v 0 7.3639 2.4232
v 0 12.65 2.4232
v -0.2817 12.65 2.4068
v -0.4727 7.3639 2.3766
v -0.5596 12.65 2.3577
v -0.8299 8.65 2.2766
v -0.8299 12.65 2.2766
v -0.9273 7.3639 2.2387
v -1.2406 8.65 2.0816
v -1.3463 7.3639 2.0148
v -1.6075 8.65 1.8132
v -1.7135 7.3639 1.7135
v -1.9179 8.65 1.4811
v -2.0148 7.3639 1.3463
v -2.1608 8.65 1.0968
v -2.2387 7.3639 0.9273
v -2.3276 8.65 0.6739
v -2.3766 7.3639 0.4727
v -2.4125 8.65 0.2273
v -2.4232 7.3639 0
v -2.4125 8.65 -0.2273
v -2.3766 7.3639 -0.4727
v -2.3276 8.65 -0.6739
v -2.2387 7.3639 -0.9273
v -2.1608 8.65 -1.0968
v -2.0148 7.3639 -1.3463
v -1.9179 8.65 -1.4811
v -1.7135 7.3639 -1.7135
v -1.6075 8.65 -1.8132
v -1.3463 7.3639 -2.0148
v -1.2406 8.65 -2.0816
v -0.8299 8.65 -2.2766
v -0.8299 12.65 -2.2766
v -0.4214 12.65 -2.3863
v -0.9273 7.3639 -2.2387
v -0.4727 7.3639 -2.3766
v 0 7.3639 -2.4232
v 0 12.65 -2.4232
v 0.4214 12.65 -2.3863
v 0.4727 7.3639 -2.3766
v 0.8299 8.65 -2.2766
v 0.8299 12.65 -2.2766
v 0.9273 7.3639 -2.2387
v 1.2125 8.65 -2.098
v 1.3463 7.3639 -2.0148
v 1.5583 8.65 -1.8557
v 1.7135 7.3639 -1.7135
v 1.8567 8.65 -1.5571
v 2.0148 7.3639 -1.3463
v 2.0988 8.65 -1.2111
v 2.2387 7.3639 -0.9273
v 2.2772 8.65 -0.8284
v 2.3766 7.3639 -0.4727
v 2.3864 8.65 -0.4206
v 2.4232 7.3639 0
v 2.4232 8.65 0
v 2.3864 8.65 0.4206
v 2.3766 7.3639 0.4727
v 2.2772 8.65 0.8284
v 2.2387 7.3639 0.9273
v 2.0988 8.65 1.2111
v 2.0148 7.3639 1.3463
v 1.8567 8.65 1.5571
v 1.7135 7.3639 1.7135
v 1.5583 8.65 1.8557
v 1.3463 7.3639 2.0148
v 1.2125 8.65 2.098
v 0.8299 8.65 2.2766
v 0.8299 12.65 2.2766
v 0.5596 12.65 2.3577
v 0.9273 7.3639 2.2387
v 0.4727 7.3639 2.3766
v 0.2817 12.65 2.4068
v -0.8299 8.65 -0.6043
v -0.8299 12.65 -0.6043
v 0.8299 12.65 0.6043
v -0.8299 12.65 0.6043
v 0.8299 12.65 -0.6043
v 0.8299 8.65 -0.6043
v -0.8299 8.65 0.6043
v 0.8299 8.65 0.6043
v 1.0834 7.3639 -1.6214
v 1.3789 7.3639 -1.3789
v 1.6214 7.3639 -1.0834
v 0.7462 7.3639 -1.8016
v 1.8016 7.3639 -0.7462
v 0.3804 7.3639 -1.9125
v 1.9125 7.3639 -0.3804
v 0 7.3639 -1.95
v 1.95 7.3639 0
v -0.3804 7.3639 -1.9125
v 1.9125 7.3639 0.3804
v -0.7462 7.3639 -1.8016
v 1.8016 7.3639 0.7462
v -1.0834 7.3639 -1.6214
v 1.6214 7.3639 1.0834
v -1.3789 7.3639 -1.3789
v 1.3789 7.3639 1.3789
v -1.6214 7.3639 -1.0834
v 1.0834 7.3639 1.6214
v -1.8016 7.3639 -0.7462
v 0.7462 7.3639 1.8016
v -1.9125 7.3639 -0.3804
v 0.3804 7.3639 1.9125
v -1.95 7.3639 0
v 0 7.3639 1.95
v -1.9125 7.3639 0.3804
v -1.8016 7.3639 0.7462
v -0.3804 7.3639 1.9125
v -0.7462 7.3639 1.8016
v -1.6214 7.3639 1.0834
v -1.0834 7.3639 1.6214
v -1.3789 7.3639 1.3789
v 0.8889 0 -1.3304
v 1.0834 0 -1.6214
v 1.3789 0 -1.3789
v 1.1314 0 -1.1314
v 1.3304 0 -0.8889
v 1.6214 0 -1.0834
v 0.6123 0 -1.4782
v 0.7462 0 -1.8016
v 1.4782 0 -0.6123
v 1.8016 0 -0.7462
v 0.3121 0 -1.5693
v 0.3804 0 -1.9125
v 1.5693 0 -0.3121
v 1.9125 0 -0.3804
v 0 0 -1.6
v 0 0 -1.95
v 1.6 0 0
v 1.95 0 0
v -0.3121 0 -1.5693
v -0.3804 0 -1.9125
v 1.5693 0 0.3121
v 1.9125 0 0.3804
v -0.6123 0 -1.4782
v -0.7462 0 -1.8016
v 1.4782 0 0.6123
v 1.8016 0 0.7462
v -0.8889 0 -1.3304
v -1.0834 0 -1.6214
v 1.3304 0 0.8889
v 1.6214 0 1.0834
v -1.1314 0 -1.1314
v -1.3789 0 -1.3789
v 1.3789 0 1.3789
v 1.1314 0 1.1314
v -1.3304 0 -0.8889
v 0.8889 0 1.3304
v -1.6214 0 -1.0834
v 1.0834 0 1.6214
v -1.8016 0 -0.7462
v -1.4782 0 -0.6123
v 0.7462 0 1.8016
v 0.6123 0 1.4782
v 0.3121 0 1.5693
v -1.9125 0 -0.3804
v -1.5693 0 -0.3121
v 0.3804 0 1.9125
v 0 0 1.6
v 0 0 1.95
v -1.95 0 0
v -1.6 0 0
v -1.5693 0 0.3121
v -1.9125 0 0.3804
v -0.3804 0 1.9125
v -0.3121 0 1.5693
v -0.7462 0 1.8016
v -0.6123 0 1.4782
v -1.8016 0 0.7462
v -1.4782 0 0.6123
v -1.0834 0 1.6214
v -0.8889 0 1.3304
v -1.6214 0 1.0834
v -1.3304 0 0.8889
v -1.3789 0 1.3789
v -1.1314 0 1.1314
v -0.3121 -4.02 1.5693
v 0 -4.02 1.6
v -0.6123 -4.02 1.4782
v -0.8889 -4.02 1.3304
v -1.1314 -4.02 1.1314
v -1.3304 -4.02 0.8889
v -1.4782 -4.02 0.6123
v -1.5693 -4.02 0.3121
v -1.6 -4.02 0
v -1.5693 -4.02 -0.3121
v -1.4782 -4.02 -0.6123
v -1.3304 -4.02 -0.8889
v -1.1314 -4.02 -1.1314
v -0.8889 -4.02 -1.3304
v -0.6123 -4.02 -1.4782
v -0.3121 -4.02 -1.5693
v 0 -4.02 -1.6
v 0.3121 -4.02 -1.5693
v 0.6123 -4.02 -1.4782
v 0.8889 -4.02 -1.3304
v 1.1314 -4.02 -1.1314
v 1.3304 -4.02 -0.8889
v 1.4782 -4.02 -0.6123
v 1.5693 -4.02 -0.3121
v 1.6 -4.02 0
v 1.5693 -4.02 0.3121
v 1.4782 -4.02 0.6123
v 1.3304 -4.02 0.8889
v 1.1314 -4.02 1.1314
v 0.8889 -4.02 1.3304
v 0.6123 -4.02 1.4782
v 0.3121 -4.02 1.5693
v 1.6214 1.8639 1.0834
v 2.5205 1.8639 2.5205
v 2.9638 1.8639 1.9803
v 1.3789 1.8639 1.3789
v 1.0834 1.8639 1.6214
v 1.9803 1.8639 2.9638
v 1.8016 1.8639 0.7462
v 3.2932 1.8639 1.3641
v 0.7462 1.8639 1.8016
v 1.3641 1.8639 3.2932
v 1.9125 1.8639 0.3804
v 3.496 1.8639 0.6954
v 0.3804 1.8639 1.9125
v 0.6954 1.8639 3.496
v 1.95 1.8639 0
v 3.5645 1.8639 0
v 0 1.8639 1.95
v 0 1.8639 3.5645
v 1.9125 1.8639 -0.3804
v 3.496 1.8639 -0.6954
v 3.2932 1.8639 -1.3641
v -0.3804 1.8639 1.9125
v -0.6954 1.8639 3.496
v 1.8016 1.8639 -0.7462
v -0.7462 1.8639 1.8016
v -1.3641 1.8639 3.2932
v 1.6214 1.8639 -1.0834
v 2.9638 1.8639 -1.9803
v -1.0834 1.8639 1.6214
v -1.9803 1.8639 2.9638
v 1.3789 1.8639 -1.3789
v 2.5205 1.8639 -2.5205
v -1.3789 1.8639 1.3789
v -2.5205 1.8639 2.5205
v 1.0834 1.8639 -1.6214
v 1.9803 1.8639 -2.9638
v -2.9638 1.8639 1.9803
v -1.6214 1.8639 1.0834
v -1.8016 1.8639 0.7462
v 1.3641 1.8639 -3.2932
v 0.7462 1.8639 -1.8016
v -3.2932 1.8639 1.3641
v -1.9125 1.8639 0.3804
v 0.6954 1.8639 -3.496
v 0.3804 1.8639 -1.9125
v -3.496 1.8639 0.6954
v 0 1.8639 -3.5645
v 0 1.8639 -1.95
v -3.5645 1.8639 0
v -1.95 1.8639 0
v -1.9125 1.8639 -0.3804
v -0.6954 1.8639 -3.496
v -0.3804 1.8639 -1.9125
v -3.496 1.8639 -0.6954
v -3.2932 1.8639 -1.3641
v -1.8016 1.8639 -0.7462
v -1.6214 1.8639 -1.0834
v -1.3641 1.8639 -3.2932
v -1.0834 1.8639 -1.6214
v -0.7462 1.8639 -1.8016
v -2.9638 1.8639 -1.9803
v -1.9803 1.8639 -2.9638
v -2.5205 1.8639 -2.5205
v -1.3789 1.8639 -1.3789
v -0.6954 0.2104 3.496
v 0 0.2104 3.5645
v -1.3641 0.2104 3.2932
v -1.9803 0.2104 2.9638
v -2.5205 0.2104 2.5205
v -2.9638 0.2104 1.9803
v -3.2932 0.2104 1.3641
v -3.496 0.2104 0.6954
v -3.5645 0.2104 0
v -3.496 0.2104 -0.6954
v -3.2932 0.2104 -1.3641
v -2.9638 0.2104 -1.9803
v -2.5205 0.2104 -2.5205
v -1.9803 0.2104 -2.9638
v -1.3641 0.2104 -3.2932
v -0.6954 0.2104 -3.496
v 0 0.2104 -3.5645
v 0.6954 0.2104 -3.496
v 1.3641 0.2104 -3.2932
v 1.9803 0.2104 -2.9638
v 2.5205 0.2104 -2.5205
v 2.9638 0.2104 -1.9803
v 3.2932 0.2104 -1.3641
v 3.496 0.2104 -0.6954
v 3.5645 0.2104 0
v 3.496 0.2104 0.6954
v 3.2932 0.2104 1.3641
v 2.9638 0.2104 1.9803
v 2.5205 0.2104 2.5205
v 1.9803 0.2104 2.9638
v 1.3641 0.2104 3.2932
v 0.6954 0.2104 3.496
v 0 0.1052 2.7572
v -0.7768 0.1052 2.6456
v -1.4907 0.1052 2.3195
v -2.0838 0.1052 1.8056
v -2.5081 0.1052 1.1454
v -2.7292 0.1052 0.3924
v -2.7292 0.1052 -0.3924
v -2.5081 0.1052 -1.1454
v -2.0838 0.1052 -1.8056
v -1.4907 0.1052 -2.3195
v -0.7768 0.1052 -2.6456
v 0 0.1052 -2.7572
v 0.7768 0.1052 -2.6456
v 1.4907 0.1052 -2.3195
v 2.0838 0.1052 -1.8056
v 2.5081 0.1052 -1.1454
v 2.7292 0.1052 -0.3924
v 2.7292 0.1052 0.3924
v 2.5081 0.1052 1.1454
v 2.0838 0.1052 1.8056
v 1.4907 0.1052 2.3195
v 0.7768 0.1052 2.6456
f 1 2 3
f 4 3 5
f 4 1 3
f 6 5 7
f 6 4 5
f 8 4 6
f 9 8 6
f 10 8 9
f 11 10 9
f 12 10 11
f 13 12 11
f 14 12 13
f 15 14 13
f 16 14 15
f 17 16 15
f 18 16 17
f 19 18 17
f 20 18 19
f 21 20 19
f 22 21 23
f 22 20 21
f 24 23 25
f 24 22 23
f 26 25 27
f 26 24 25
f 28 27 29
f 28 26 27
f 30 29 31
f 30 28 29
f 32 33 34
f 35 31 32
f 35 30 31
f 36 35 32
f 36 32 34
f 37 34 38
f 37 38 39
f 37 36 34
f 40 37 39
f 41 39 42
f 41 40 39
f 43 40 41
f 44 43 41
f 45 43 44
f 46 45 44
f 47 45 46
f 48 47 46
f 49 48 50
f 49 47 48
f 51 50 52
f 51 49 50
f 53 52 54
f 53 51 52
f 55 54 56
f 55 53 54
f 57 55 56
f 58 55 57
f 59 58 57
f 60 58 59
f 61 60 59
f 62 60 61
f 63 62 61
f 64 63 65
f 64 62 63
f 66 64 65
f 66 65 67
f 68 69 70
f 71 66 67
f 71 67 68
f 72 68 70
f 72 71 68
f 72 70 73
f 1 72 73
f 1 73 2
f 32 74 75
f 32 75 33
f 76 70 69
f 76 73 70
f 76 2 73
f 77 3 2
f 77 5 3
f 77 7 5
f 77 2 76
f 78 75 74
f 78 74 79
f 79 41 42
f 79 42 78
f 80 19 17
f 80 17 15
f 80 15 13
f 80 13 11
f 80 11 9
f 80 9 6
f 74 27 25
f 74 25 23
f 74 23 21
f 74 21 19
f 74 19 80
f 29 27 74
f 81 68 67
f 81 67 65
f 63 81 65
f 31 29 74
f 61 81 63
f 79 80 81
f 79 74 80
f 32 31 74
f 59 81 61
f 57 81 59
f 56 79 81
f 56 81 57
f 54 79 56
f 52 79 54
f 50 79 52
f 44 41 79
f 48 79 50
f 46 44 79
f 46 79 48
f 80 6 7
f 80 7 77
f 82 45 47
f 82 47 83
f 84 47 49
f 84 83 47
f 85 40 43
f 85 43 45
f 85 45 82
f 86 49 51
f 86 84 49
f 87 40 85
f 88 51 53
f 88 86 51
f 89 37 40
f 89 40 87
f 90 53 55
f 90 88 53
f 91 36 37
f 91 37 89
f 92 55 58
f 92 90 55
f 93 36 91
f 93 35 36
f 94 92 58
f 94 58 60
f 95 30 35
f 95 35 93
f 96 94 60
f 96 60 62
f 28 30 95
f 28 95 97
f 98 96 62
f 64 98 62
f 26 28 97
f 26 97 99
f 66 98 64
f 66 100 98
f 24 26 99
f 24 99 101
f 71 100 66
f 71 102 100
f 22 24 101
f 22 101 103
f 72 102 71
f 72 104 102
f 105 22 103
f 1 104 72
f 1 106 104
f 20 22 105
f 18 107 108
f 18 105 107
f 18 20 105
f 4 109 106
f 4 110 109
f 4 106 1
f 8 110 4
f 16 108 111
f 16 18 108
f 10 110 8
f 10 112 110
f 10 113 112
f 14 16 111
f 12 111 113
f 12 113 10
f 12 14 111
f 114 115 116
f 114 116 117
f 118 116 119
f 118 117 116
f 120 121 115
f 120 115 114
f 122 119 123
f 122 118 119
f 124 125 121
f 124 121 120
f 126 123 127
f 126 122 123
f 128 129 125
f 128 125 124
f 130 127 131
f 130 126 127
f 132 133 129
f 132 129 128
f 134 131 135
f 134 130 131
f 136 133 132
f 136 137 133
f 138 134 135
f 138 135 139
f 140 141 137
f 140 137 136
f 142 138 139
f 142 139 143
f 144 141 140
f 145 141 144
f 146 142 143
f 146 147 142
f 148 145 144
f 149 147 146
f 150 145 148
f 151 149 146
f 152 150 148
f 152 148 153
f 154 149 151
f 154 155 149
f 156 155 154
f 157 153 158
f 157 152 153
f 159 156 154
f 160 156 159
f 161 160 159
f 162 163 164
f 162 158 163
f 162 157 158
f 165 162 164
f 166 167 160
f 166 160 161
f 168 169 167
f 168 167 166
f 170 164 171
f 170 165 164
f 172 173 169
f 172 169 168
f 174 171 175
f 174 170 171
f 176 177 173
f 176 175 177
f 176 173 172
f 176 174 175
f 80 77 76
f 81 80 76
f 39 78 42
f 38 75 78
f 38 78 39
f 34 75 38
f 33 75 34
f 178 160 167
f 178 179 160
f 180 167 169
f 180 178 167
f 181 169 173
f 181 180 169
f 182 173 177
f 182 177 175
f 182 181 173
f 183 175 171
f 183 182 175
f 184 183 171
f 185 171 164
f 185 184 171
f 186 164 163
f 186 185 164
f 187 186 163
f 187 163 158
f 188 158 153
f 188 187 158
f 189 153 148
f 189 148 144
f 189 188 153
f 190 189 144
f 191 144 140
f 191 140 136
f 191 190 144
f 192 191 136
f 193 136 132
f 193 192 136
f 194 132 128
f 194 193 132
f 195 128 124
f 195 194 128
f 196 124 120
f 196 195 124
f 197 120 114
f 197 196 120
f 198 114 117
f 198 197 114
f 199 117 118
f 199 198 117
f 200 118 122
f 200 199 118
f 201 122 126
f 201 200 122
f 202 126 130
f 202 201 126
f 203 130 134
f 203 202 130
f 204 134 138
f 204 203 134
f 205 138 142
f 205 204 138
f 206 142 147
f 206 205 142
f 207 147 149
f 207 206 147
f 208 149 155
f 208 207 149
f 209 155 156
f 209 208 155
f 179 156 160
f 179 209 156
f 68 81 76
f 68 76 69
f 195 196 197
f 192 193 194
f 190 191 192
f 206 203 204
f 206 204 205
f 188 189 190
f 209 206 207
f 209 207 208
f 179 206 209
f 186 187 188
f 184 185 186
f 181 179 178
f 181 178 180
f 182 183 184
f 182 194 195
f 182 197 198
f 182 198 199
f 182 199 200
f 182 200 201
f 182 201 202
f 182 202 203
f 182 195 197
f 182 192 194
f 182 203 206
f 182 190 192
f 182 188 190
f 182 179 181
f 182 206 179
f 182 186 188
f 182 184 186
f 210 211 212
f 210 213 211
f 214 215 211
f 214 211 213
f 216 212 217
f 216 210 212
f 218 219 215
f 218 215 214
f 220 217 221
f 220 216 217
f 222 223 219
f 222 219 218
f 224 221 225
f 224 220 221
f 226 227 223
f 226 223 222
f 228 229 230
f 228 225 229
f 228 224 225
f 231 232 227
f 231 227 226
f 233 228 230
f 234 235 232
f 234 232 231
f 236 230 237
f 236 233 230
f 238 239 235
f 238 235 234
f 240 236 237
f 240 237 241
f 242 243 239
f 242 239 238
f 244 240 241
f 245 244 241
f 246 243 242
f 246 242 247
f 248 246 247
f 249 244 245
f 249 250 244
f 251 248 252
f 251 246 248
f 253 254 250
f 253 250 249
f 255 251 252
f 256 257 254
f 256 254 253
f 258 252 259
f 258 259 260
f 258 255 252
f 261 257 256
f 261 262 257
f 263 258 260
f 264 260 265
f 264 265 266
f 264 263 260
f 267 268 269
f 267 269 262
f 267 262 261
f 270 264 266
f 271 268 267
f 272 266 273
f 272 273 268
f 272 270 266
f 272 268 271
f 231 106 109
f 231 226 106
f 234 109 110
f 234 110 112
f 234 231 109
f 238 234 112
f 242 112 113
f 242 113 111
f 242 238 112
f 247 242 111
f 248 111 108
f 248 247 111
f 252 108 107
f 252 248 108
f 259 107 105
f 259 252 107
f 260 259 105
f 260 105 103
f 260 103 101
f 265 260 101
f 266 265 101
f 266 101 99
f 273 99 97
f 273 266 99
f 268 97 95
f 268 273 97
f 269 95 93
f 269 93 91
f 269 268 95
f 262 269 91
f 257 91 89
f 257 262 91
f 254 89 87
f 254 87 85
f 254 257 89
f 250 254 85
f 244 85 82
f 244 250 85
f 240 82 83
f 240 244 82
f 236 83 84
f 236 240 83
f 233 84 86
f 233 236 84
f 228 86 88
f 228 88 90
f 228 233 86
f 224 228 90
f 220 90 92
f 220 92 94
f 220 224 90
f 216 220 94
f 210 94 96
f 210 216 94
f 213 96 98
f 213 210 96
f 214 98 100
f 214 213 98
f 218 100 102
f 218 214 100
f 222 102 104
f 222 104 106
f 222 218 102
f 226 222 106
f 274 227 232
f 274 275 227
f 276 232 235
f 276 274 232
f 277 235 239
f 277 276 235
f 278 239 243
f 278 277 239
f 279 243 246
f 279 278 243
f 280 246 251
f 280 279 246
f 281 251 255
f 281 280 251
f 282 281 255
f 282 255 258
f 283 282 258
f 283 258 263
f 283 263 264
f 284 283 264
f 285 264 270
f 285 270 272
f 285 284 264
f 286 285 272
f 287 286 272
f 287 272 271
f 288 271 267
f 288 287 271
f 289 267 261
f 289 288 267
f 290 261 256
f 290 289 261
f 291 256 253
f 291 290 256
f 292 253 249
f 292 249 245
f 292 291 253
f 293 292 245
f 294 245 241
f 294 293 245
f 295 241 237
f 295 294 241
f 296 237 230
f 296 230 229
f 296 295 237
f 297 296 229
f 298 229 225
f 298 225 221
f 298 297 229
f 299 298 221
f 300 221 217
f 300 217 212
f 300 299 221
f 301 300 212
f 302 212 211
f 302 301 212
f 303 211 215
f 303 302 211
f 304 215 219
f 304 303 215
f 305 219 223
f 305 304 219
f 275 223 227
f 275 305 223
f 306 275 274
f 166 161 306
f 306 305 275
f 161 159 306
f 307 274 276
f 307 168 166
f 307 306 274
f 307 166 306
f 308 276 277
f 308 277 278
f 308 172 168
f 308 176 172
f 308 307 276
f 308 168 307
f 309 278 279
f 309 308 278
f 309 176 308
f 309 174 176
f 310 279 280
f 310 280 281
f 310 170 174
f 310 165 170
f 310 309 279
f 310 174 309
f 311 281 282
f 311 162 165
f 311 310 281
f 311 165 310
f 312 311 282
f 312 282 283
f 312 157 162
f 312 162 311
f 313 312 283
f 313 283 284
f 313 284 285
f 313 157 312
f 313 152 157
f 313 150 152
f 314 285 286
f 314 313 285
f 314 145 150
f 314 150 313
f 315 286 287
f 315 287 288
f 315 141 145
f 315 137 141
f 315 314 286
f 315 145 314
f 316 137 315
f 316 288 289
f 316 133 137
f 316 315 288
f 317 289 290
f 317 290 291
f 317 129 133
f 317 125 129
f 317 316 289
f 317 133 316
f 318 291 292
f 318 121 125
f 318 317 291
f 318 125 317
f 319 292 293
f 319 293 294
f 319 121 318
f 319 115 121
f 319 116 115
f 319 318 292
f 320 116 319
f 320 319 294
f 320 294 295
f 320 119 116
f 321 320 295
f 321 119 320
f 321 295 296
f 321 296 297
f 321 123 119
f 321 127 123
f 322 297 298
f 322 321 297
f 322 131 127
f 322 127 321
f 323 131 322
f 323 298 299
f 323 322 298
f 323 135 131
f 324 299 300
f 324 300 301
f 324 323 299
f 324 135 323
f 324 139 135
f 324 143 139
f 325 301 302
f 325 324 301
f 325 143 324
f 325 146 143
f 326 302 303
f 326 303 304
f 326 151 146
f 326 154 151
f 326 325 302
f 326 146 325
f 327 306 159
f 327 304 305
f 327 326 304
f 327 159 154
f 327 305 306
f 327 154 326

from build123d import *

# Parameters (mm, degrees)
CORTAR_EXTRUIR1_START = -4
CORTAR_EXTRUIR1_DEPTH = 4
CROQUIS7_W            = 2.599739018
CROQUIS7_H            = 1.208627888
CORTAR_EXTRUIR2_DEPTH = 4


with BuildPart() as part:
    # Croquis1 → Revolución1 (revolve)
    with BuildSketch(Plane(origin=(0, 0, 0), x_dir=(0, 0, -1), z_dir=(1, 0, 0)), mode=Mode.PRIVATE) as revoluci_n1_sk:
        Polygon((0, -4.02), (0, 0), (0, 12.65), (2.423190966, 12.65), (2.423190966, 7.363853001), (1.95, 7.363853001), (1.95, 1.863853001), (3.564484464, 1.863853001), (3.564484464, 0.210352158), (1.95, 0), (1.6, 0), (1.6, -4.02), align=None)
    revolve(revoluci_n1_sk.sketch.rotate(Axis((0, 12.65, 0), (0, -1, 0)), 180), axis=Axis((0, 12.65, 0), (0, -1, 0)))

    # Croquis6 → Cortar-Extruir1 (cut)
    with BuildSketch(Plane(origin=(0, 12.65, 0), x_dir=(1, 0, 0), z_dir=(0, 1, 0)).offset(CORTAR_EXTRUIR1_START)):
        with BuildLine():
            ThreePointArc((2.423190966, 0), (1.985316553, 1.38937851), (0.8299425, 2.276631263))
            Line((0.8299425, 2.276631263), (0.8299425, -2.276631263))
            ThreePointArc((0.8299425, -2.276631263), (1.985316553, -1.38937851), (2.423190966, 0))
        make_face()
        with BuildLine():
            Line((-0.8299425, -2.276631263), (-0.8299425, 2.276631263))
            ThreePointArc((-0.8299425, 2.276631263), (-2.423190966, 0), (-0.8299425, -2.276631263))
        make_face()
    extrude(amount=CORTAR_EXTRUIR1_DEPTH, mode=Mode.SUBTRACT)

    # Croquis7 → Cortar-Extruir2 (cut)
    with BuildSketch(Plane(origin=(0, 12.65, 0), x_dir=(1, 0, 0), z_dir=(0, 1, 0))):
        Rectangle(CROQUIS7_W, CROQUIS7_H)
    extrude(amount=-CORTAR_EXTRUIR2_DEPTH, mode=Mode.SUBTRACT)


solid = part.part
